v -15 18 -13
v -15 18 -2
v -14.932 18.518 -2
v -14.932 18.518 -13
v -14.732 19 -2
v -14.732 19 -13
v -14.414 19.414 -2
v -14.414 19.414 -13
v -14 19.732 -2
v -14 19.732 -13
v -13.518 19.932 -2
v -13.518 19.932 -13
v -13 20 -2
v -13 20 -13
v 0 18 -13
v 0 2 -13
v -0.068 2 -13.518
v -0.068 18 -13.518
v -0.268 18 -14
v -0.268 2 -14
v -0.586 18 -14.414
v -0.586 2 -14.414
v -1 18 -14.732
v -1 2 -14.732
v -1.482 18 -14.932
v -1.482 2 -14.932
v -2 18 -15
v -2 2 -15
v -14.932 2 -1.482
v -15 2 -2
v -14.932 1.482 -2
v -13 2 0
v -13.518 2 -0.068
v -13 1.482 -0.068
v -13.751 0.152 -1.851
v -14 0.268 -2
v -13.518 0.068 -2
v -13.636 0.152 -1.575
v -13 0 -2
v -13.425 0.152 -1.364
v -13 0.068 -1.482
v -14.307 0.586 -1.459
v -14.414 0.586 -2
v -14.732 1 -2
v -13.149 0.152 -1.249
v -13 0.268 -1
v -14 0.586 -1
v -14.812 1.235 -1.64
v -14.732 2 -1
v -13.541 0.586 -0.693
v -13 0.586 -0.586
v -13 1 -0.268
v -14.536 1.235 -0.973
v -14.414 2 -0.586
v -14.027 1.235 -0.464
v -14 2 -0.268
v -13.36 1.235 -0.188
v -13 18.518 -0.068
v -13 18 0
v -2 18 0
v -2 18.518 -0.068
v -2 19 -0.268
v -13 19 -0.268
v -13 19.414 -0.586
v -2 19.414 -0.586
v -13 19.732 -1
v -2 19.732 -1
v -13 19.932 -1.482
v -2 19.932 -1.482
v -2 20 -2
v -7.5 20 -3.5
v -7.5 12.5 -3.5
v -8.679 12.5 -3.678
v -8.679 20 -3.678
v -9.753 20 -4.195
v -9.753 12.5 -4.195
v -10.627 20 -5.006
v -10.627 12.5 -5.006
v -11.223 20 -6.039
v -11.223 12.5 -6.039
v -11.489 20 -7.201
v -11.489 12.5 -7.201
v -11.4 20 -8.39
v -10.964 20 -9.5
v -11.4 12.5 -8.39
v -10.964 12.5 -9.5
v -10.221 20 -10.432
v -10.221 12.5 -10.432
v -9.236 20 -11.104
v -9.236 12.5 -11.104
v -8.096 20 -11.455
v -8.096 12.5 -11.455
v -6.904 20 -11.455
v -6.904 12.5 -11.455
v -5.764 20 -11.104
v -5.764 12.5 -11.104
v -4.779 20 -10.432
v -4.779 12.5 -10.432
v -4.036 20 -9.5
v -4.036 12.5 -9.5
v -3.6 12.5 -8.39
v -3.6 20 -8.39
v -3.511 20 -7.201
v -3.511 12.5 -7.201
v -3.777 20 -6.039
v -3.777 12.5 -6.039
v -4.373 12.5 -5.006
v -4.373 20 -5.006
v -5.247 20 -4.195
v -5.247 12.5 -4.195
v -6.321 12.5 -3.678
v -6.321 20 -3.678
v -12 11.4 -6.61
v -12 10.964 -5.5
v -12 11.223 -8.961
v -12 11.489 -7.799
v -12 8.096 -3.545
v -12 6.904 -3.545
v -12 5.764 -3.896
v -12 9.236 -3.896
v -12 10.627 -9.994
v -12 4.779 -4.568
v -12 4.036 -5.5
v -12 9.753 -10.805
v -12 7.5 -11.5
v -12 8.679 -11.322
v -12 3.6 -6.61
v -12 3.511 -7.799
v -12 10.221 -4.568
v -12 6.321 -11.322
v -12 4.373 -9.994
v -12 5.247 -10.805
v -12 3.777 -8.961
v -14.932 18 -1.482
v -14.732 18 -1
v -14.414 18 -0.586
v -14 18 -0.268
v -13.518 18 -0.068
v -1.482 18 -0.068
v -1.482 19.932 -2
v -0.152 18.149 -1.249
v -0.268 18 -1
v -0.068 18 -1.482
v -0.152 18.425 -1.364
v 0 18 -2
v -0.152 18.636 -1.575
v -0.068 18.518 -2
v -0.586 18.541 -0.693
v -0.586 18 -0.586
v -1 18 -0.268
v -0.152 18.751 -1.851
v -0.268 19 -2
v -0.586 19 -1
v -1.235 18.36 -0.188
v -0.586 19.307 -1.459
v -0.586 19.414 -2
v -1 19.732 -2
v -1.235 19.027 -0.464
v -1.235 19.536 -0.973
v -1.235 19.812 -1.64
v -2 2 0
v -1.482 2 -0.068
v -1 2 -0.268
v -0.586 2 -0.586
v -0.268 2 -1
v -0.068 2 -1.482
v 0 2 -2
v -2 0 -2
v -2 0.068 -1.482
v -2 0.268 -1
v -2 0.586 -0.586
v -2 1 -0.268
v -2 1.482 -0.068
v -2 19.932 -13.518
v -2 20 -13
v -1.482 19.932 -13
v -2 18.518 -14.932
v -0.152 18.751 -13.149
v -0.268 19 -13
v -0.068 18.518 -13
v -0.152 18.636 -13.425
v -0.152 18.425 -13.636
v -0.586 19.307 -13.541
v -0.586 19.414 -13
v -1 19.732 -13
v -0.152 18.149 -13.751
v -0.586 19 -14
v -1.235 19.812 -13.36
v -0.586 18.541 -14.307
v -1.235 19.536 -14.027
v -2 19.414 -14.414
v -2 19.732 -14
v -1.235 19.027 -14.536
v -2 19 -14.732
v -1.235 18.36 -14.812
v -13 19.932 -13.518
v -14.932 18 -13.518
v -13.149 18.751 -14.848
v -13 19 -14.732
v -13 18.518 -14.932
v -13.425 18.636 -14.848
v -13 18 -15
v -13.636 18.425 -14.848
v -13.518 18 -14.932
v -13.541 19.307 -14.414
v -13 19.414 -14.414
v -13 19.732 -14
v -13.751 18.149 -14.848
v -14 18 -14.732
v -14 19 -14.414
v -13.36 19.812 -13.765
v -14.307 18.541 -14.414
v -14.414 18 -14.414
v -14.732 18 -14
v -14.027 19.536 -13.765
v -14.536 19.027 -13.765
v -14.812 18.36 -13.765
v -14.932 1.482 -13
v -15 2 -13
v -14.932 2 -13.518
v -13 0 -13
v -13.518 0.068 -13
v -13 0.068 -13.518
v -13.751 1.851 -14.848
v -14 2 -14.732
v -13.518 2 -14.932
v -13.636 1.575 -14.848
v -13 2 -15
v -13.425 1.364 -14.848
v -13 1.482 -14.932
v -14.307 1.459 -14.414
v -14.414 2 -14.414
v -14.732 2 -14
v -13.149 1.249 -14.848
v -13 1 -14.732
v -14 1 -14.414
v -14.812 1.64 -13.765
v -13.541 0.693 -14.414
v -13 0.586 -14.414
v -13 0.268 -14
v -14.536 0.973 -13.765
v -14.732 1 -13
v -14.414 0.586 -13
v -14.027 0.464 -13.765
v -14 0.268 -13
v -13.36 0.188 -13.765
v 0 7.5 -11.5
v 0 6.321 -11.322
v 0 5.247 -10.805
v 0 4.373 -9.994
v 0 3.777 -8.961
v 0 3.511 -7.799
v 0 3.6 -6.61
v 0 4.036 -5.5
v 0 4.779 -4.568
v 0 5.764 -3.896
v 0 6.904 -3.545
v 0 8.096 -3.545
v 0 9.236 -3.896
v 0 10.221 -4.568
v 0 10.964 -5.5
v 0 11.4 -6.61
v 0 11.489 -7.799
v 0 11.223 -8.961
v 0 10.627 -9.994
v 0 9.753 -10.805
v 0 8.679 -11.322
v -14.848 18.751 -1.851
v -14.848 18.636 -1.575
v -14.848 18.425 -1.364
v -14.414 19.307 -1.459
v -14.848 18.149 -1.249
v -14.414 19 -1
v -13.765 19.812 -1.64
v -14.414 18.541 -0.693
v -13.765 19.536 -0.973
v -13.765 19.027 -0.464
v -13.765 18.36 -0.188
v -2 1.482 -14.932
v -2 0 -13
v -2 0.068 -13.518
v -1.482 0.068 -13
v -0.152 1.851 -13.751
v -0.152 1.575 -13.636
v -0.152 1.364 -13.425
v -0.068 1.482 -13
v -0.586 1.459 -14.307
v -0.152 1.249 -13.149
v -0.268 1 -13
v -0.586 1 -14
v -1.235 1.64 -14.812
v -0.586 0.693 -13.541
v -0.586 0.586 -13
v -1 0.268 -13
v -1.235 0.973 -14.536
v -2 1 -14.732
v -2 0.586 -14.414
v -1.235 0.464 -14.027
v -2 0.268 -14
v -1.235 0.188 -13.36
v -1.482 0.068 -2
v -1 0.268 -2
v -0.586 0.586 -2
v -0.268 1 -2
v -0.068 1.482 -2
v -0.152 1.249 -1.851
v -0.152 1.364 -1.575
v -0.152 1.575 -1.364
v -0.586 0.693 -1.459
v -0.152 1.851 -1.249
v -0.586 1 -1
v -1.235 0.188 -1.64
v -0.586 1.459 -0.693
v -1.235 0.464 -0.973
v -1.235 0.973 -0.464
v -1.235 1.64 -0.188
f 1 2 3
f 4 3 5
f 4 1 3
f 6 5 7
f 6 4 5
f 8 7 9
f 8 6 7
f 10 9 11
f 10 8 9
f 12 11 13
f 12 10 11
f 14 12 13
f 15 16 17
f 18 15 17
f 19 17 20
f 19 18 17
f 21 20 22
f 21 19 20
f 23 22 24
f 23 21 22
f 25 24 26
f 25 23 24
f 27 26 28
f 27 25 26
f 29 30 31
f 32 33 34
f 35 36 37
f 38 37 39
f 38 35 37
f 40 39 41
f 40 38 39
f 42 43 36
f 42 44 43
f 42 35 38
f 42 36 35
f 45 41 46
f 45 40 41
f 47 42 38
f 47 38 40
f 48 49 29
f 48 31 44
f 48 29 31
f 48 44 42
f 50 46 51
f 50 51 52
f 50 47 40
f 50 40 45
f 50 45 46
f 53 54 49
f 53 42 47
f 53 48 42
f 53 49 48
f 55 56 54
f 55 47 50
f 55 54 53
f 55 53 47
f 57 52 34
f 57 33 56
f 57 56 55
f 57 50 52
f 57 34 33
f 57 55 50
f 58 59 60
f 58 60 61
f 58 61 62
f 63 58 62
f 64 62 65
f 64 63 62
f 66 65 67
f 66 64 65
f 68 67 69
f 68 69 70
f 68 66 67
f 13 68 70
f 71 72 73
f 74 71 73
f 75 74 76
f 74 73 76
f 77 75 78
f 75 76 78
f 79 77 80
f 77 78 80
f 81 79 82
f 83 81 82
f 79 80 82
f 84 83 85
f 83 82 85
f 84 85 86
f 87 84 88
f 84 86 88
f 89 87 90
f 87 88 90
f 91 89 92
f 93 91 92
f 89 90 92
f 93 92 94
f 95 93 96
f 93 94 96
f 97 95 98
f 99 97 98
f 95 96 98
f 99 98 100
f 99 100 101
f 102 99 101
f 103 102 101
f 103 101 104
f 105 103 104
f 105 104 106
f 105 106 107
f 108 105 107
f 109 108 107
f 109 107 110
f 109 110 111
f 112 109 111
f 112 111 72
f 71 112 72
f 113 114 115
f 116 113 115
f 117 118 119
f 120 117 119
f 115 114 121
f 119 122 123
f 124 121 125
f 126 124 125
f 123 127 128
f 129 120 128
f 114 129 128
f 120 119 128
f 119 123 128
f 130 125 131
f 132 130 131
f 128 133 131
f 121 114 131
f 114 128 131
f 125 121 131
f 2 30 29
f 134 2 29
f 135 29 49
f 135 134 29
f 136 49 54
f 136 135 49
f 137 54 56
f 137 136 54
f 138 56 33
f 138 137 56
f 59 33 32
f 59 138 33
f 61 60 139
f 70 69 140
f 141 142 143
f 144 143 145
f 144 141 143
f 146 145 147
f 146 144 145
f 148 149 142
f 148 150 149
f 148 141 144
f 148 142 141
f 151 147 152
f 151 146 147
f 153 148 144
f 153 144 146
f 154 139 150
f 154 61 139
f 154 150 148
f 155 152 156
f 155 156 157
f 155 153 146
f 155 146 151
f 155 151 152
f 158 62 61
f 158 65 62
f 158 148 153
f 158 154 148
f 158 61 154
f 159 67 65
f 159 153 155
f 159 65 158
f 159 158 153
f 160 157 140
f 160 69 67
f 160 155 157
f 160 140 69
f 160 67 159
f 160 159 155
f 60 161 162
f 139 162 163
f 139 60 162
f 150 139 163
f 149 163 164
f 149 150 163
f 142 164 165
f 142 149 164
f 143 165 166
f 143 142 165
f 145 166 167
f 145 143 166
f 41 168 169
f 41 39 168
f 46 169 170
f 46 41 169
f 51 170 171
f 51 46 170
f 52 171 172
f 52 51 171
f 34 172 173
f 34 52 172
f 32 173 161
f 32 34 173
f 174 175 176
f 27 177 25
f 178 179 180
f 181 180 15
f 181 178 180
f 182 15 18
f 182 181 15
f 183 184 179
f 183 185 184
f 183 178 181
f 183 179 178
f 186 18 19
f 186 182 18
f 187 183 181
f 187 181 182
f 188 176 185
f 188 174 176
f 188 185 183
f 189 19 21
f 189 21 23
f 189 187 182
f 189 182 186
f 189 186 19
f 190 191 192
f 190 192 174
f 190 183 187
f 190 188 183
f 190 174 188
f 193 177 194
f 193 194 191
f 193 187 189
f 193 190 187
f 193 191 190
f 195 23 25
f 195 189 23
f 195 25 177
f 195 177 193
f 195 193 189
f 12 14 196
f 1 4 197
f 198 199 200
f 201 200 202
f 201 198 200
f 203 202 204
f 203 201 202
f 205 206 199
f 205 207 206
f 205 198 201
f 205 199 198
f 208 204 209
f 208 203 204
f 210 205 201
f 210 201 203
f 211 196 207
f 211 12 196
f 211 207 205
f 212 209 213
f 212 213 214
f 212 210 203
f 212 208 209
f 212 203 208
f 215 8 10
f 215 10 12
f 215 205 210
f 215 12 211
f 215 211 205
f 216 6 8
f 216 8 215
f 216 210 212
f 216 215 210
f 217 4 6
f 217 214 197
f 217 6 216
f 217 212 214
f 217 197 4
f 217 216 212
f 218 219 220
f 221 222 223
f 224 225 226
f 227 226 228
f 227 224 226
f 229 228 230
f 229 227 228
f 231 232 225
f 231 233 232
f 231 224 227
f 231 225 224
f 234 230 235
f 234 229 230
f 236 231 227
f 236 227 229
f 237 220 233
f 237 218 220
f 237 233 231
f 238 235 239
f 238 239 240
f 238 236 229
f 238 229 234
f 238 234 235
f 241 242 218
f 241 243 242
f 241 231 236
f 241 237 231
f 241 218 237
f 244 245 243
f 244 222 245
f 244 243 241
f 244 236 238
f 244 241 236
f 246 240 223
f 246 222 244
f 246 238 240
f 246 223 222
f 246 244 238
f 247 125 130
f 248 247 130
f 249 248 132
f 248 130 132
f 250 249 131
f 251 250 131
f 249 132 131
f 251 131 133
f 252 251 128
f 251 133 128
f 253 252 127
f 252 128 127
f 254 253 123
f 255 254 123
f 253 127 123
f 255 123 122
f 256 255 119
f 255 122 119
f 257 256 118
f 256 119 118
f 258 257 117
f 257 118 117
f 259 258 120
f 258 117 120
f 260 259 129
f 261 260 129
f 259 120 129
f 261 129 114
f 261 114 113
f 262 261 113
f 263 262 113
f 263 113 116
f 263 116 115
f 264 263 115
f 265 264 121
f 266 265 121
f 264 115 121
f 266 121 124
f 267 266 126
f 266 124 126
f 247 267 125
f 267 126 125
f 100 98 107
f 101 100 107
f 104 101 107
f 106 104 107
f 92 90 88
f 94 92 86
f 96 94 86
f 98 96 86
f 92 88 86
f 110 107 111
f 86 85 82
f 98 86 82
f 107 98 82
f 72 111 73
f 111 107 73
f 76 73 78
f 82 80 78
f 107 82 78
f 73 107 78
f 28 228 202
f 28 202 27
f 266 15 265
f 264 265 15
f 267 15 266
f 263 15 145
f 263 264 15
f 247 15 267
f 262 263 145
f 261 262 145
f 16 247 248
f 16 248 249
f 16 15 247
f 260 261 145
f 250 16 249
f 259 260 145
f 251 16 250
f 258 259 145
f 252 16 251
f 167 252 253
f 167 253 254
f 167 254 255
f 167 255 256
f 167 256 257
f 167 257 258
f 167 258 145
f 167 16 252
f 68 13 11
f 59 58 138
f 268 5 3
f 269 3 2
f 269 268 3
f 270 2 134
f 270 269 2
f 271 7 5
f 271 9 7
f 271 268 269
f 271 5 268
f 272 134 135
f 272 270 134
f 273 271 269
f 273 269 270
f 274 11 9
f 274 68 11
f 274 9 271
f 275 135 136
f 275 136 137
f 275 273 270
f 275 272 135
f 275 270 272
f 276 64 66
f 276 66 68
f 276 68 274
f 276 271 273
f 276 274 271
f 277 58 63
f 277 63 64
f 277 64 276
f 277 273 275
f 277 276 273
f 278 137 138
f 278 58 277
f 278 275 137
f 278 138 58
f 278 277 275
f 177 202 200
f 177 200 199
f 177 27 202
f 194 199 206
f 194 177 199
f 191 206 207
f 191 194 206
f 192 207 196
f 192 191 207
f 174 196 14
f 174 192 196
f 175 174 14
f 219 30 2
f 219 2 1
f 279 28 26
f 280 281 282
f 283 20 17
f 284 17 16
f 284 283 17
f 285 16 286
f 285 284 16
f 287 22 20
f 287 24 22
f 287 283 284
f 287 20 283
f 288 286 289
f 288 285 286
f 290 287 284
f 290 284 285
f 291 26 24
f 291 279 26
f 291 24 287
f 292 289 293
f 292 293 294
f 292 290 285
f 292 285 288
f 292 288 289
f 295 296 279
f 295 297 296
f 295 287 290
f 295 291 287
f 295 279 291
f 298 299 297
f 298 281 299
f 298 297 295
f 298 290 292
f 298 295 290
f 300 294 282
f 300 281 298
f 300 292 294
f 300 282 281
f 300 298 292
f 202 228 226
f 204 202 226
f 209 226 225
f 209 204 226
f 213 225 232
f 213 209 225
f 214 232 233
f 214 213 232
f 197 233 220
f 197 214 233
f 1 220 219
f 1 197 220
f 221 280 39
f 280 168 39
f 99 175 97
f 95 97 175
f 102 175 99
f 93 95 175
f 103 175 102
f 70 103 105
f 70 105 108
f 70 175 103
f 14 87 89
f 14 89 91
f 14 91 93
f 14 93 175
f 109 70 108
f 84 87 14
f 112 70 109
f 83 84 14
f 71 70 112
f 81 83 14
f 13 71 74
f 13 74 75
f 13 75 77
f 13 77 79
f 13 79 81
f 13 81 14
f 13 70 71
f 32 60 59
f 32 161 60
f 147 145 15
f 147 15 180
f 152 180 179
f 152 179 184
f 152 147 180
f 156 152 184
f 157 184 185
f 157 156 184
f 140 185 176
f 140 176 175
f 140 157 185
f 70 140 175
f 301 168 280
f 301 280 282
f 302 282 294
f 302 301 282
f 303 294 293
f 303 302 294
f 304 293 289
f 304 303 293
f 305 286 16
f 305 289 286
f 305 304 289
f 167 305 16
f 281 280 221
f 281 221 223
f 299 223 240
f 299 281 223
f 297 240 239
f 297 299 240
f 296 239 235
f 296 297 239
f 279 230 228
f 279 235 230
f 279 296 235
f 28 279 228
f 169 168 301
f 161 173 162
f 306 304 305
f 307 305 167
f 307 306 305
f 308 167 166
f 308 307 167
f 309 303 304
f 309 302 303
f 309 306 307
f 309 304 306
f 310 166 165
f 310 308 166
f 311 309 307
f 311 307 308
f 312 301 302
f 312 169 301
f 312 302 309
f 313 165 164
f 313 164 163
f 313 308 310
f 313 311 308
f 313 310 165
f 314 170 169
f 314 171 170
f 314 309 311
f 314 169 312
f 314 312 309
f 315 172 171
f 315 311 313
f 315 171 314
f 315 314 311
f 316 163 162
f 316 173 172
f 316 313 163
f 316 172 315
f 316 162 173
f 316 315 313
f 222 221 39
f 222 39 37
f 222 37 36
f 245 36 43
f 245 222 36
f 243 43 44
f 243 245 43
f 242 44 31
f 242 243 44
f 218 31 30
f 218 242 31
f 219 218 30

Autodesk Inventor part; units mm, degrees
ref_plane "YZ Plane" through (0, 0, 0) normal (1, 0, 0) x (0, 1, 0)
ref_plane "XZ Plane" through (0, 0, 0) normal (0, 1, 0) x (-1, 0, 0)
ref_plane "XY Plane" through (0, 0, 0) normal (0, 0, 1) x (1, 0, 0)
sketch "Esboço1" plane through (0, 0, 0) normal (0, 1, 0) x (-1, 0, 0)
  line L0 (0, 0) -> (15, 0)
  line L1 (15, 0) -> (15, -15)
  line L2 (15, -15) -> (0, -15)
  line L3 (0, -15) -> (0, 0)
  dimension "d0" = 15
  dimension "d1" = 15
extrude "Extrusão1" add sketch "Esboço1" along normal blind 20
sketch "Esboço2" plane through (0, 0, 0) normal (1, 0, 0) x (0, 0, -1)
  point P0 (0, 0)
  point P1 (7.5, 7.5)
hole "Furo1" at (0, 7.5, -7.5) direction (-1, 0, 0) diameter 8 depth 12
sketch "Esboço4" plane through (0, 20, 0) normal (0, 1, 0) x (1, 0, 0)
  point P0 (0, 0)
  point P1 (-7.5, 7.5)
hole "Furo2" at (-7.5, 20, -7.5) direction (0, -1, 0) diameter 8 depth 7.5
fillet "Arredondamento1" radius 2 12 edges at (-7.5, 20, 0) (-15, 10, 0) (-15, 20, -7.5) (-7.5, 0, 0) (-15, 0, -7.5) (-15, 10, -15) (-7.5, 0, -15) (-7.5, 20, -15) (0, 10, -15) (0, 0, -7.5) (0, 10, 0) (0, 20, -7.5)
properties part number "cantoneira"
